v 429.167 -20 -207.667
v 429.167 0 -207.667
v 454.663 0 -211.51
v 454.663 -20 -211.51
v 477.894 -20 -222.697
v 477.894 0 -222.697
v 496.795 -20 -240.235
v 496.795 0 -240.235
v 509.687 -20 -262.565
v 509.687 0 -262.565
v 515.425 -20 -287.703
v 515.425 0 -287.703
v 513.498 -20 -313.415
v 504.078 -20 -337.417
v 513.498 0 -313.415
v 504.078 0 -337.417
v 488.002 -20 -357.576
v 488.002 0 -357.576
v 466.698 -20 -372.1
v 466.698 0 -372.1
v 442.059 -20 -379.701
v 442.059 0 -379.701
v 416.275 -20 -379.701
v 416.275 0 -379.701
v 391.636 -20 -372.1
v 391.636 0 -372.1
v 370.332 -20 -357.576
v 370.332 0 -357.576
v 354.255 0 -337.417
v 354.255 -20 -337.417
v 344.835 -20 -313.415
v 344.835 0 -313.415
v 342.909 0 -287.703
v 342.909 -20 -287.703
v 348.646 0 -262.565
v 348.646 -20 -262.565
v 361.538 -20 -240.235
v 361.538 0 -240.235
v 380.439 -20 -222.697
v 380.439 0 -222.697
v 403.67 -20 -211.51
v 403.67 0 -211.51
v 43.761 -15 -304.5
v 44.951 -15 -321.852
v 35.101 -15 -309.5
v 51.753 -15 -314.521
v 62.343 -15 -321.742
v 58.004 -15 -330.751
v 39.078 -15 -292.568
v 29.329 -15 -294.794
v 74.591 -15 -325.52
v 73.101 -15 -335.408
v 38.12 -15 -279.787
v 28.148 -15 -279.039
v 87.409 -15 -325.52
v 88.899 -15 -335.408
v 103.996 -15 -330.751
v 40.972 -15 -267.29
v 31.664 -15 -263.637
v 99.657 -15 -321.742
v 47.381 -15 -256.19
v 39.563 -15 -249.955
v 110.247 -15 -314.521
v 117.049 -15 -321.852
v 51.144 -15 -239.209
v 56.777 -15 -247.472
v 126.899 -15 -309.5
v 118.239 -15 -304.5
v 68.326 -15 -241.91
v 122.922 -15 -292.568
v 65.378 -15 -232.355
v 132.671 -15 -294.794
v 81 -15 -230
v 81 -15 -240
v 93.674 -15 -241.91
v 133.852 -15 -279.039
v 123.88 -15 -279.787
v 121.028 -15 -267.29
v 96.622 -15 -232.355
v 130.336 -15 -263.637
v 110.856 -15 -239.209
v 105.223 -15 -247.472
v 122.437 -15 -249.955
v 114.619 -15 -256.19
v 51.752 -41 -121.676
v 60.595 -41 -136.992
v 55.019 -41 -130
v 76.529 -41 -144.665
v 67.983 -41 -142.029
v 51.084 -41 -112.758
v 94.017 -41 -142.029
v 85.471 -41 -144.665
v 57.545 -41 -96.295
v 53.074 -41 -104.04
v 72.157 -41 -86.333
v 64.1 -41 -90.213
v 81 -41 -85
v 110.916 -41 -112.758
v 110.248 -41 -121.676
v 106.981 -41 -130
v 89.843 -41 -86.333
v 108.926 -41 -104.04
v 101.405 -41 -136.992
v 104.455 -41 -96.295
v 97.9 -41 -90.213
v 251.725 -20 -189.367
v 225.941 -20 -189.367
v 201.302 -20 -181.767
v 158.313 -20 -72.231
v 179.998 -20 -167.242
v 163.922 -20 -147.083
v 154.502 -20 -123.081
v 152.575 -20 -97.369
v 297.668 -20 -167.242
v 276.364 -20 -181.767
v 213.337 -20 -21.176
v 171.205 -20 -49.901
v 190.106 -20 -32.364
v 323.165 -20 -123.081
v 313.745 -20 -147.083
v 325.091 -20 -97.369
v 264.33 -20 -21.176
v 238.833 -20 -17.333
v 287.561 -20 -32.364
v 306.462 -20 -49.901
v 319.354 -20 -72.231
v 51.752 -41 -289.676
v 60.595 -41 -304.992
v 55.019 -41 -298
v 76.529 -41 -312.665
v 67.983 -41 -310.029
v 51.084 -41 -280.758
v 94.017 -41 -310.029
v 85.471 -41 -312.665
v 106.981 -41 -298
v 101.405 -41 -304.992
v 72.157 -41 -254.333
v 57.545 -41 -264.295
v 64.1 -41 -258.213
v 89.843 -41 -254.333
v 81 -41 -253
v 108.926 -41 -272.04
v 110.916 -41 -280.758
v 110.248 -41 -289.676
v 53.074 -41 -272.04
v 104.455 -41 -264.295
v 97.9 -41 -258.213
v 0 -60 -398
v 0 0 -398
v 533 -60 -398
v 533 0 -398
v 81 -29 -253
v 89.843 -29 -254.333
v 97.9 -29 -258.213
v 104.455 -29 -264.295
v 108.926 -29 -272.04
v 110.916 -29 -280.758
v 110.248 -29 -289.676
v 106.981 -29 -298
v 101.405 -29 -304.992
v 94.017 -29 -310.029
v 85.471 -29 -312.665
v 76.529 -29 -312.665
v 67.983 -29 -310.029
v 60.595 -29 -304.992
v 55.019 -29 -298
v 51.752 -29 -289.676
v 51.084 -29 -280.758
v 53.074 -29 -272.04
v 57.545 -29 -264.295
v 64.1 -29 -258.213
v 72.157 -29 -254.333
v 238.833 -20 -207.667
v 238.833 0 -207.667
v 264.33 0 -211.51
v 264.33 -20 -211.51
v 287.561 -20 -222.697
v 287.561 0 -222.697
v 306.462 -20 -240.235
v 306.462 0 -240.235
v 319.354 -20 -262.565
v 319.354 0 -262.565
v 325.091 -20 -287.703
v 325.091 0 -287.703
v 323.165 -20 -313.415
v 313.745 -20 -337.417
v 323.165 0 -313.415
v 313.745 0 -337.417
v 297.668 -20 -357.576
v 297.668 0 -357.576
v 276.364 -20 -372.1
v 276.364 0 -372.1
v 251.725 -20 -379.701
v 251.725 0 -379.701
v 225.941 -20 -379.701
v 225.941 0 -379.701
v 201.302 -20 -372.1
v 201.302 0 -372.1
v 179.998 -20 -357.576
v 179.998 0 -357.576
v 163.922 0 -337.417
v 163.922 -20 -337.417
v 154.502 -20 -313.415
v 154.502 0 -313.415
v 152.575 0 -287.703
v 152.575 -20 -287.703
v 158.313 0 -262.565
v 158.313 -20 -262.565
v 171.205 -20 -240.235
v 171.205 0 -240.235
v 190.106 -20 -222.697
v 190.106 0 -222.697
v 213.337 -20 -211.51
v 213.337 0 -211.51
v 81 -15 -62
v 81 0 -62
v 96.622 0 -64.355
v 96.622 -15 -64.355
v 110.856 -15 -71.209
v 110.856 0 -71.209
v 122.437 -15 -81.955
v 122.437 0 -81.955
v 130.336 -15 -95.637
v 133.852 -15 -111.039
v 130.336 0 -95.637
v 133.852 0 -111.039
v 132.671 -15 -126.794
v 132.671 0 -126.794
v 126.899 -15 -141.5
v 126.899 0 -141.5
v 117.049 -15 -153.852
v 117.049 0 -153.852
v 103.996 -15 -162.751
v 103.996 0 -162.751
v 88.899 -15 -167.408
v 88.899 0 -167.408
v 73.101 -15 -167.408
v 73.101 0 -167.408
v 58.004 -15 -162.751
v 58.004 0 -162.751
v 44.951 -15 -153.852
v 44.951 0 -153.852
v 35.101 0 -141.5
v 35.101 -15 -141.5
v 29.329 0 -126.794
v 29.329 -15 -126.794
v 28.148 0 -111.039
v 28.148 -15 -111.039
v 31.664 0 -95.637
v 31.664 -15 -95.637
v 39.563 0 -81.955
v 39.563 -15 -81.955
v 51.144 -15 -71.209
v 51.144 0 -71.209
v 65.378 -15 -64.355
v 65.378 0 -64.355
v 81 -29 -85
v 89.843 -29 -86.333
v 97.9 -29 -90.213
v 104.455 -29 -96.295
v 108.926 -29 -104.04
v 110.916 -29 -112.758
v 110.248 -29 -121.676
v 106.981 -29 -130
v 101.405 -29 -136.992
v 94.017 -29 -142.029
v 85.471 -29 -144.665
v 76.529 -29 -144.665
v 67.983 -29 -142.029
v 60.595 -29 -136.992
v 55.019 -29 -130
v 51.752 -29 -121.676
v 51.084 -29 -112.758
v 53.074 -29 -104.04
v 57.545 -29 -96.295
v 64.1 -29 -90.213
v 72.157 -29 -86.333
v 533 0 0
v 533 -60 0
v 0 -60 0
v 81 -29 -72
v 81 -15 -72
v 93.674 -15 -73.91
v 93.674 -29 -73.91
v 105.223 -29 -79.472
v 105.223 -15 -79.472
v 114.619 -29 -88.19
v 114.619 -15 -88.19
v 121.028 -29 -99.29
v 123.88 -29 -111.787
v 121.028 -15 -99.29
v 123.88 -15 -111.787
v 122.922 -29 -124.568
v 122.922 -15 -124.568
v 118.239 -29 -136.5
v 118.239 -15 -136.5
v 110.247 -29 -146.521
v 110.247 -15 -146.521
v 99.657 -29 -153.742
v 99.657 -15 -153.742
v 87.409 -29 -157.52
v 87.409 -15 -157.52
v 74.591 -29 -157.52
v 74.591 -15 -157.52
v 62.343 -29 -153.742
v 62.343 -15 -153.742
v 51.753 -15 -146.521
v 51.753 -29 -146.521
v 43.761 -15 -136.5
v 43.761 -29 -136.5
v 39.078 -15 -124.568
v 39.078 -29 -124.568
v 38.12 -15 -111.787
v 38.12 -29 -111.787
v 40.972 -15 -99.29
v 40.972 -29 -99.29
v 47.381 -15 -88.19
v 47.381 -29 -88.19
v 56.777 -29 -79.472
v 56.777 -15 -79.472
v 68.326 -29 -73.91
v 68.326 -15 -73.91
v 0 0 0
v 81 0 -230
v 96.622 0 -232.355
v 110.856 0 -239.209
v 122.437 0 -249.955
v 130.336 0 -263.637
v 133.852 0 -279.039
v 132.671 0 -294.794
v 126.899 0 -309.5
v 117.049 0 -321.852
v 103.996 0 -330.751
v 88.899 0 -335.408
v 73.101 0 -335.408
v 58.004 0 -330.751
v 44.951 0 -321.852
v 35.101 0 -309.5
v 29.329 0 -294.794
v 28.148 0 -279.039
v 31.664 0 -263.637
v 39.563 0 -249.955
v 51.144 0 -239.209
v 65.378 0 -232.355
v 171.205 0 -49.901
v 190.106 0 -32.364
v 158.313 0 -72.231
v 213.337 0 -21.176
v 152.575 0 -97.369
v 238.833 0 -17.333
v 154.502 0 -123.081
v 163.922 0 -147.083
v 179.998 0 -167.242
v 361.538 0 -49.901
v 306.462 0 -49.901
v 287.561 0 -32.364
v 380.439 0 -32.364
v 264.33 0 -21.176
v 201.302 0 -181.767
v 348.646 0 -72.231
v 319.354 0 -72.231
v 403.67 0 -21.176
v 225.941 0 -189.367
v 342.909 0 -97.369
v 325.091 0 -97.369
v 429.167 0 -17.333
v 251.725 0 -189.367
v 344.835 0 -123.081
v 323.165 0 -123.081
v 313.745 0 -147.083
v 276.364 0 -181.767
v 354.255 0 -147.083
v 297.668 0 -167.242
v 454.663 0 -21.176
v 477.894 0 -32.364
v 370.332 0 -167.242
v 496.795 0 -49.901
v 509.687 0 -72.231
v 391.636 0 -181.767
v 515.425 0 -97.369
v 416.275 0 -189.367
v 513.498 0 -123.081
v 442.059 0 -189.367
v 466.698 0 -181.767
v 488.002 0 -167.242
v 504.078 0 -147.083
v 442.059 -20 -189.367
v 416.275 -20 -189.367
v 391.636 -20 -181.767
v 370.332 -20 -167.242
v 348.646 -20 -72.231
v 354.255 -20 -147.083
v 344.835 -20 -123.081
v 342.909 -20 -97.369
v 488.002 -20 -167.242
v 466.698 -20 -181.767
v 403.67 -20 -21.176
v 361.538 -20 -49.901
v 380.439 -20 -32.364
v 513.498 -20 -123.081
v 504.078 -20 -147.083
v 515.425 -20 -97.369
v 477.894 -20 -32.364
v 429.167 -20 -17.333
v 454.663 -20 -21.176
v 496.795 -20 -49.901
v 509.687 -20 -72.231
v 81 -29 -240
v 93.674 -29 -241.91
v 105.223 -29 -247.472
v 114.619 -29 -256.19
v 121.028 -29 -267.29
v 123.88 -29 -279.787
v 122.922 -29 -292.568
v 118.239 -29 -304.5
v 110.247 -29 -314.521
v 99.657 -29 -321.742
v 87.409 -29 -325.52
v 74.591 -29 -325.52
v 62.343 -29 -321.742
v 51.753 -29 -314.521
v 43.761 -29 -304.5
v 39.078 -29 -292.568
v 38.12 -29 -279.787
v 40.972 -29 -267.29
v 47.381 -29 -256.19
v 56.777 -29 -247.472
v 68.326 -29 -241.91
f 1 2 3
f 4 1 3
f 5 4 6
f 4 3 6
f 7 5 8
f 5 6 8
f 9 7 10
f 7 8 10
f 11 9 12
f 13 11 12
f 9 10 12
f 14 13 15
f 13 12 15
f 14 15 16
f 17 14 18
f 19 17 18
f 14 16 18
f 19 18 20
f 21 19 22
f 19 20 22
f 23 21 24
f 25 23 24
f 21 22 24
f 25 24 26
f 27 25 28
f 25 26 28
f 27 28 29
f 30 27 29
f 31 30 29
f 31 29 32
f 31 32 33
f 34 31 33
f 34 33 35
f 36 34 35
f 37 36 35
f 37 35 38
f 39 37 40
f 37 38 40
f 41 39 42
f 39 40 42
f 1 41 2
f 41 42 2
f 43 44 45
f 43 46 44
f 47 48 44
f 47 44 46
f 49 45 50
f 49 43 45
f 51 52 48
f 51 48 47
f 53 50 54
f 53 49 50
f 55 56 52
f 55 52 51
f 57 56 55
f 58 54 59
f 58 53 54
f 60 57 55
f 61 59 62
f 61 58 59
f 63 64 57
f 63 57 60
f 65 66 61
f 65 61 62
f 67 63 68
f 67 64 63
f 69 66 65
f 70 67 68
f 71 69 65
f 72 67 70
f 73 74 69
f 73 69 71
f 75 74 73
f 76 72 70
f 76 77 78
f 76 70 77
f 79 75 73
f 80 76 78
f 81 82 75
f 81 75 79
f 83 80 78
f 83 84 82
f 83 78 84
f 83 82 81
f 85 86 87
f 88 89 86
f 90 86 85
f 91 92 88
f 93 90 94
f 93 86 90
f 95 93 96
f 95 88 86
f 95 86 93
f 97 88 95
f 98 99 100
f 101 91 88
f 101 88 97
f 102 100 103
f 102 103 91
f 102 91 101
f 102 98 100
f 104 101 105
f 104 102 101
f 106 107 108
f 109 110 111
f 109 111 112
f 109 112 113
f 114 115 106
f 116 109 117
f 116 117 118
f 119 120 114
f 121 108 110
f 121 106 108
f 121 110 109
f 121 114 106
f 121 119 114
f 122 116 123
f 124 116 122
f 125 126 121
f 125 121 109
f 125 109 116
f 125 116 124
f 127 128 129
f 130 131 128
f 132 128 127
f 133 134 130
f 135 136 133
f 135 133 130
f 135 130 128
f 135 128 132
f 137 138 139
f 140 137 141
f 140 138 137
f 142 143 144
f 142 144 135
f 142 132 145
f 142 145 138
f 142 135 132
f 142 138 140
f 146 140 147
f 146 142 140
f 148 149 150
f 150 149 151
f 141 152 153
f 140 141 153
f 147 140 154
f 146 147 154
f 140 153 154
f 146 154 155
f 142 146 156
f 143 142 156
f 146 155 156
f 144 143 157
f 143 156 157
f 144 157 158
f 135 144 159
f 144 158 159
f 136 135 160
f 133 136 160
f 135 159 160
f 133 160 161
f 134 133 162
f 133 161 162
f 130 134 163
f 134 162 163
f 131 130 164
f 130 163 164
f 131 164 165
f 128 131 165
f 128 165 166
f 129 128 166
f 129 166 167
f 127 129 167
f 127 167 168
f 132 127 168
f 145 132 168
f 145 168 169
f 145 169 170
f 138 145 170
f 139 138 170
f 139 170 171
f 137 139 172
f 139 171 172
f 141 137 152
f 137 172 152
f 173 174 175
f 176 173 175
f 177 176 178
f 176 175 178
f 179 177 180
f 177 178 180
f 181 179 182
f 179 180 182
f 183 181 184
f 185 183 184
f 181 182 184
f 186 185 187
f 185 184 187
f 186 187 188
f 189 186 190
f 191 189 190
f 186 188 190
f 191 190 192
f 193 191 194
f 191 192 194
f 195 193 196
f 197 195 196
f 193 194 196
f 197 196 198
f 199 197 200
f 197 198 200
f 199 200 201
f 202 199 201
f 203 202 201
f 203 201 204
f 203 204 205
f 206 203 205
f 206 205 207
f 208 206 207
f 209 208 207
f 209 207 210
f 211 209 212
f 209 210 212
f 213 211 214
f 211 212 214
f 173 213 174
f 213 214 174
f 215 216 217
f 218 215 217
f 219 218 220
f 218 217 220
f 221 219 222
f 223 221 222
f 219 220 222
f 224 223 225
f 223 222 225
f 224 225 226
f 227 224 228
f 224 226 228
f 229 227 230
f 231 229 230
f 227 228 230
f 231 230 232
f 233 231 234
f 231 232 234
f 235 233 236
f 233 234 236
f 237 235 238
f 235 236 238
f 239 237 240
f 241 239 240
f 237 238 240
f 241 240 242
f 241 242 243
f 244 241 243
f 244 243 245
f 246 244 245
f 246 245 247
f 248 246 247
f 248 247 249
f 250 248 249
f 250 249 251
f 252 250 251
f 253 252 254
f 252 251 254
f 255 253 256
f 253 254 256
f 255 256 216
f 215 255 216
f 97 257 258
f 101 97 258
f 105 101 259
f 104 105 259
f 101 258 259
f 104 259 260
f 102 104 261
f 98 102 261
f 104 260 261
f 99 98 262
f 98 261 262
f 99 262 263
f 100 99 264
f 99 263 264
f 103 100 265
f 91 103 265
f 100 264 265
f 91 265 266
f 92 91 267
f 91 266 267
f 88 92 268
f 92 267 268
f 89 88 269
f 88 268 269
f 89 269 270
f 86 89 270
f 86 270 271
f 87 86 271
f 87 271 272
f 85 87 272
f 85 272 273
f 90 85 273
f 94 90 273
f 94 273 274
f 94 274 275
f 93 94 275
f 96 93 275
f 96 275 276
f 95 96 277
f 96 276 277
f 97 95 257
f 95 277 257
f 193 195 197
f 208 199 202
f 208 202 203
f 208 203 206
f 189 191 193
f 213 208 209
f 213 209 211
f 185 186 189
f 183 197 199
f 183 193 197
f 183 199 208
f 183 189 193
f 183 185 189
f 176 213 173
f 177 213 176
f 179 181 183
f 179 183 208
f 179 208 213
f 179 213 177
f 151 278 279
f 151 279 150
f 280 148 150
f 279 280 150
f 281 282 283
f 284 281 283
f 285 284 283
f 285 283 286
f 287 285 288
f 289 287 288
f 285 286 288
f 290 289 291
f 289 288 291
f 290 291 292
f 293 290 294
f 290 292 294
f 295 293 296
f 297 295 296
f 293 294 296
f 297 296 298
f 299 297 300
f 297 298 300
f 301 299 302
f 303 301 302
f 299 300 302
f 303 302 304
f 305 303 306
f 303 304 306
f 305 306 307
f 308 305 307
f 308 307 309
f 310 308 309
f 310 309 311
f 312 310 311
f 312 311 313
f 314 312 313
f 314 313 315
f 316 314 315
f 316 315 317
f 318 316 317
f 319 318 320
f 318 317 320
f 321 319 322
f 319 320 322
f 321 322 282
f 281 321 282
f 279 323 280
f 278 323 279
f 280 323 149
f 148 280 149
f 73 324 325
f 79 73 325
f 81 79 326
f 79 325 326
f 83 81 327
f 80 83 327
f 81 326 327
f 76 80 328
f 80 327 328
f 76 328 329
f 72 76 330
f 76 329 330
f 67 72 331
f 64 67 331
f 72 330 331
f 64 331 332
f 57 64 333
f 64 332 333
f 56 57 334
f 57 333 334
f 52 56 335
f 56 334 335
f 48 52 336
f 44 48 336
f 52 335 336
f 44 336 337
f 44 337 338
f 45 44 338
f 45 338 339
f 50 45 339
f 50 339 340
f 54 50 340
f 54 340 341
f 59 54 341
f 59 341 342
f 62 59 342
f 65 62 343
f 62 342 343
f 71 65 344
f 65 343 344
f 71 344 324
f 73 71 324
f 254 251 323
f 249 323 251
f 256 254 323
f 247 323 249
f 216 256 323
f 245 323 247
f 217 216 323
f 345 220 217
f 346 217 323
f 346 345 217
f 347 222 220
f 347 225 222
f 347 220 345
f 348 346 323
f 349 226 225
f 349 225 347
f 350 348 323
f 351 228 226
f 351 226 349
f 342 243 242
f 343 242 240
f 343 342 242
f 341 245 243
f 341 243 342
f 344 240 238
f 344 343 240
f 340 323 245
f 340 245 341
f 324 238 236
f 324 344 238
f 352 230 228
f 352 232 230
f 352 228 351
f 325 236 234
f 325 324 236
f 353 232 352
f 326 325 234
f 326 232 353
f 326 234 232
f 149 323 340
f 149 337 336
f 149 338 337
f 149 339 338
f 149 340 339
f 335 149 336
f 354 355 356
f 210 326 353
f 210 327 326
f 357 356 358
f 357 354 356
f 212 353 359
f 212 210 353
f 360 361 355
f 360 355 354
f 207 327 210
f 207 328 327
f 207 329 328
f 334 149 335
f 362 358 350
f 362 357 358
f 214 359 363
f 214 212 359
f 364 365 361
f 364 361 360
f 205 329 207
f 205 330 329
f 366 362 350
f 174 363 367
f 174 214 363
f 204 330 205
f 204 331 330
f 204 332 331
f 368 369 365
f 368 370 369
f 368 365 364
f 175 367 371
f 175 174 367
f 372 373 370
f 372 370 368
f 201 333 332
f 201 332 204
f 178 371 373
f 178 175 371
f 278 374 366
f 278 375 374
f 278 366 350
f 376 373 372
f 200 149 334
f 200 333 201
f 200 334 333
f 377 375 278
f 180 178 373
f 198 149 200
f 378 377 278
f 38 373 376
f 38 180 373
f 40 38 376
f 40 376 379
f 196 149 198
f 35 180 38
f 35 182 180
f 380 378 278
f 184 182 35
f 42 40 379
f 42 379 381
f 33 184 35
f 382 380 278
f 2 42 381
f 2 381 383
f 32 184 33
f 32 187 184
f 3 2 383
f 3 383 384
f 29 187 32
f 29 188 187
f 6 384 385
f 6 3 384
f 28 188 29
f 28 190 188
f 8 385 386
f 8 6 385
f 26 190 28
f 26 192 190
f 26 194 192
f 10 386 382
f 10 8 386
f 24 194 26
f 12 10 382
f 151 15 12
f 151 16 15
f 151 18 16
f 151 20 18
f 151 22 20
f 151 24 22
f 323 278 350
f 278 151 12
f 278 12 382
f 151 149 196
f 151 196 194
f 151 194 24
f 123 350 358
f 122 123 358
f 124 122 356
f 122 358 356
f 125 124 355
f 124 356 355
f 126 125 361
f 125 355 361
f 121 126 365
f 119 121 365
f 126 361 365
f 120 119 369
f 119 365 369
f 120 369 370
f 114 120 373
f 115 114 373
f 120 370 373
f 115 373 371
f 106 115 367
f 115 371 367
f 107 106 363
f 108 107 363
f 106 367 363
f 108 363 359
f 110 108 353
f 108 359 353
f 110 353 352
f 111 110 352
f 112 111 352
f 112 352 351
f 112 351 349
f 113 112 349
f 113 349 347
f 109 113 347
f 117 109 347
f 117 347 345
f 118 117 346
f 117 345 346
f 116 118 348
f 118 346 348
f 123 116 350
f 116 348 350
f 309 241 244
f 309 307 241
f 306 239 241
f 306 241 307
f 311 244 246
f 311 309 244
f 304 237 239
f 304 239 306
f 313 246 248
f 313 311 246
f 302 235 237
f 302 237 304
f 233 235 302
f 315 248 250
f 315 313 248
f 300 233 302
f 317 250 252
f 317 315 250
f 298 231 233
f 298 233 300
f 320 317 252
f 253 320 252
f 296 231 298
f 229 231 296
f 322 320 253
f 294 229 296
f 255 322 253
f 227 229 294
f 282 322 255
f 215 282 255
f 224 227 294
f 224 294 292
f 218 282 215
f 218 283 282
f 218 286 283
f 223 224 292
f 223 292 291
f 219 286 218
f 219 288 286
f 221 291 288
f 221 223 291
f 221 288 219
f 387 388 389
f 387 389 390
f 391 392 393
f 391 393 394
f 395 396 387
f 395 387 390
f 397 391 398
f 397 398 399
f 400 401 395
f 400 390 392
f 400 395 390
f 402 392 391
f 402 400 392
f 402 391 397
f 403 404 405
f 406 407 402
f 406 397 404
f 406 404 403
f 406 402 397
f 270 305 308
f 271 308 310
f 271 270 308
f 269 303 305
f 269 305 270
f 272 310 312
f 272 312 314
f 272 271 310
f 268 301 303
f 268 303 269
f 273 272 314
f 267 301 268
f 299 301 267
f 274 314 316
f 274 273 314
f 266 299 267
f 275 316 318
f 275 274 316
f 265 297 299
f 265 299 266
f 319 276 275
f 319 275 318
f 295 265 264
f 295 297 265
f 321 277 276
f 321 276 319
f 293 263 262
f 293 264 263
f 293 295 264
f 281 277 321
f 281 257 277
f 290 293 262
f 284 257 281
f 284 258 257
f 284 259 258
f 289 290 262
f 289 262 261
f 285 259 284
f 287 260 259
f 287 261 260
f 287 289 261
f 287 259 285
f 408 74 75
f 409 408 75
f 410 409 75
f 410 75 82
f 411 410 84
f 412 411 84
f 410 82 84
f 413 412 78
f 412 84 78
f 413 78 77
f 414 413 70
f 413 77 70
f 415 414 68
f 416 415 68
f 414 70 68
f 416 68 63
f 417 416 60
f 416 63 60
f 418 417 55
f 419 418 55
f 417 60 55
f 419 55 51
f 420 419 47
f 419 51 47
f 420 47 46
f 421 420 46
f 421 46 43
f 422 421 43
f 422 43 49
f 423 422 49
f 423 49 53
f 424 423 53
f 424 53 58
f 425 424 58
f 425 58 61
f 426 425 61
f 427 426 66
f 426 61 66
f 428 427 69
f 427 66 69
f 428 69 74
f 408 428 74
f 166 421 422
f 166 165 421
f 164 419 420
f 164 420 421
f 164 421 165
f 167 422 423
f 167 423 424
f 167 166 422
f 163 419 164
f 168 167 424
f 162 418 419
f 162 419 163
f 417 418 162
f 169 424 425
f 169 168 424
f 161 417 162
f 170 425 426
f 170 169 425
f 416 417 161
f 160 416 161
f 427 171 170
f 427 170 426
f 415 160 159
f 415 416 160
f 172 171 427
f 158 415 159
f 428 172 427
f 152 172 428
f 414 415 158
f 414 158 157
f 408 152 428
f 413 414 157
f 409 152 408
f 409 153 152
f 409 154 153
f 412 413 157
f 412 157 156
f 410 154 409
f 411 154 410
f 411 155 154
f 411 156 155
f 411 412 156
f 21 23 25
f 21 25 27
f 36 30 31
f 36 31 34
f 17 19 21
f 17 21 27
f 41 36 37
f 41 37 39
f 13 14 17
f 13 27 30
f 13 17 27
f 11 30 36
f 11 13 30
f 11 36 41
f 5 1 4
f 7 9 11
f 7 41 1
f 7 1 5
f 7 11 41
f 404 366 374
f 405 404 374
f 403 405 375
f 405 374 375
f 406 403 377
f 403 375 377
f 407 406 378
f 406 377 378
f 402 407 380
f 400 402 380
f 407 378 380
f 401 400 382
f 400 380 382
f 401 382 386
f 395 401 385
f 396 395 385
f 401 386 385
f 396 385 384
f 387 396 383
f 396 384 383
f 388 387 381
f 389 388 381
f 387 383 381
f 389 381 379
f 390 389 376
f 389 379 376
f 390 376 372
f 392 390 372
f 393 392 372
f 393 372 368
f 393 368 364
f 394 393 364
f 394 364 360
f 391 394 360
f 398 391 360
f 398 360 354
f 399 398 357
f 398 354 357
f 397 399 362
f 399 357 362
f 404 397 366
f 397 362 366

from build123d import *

# Parameters (mm, degrees)
SKETCH_1_W            = 533
SKETCH_1_H            = 398
EXTRUDE_237_DEPTH     = 60
SKETCH_2_R            = 86.5
CUT_EXTRUDE_597_DEPTH = 20
SKETCH_3_R            = 53
CUT_EXTRUDE_101_DEPTH = 15
SKETCH_6_R            = 43
CUT_EXTRUDE_5_DEPTH   = 14
SKETCH_7_R            = 30
CUT_EXTRUDE_6_DEPTH   = 12


with BuildPart() as part:
    # Эскиз1 → Extrude 237 (new body)
    with BuildSketch(Plane(origin=(0, 0, 0), x_dir=(1, 0, 0), z_dir=(0, 1, 0))):
        with Locations((266.5, 199)):
            Rectangle(SKETCH_1_W, SKETCH_1_H)
    extrude(amount=-EXTRUDE_237_DEPTH)

    # Эскиз2 → Р597 (cut)
    with BuildSketch(Plane(origin=(0, 0, 0), x_dir=(1, 0, 0), z_dir=(0, 1, 0))):
        with Locations(Location((429.166666667, 103.833333333, 0), (0, 0, 270))):
            Circle(SKETCH_2_R)
        with Locations(Location((238.833333333, 103.833333333, 0), (0, 0, 270))):
            Circle(SKETCH_2_R)
        with Locations(Location((238.833333333, 294.166666667, 0), (0, 0, 270))):
            Circle(SKETCH_2_R)
        with Locations(Location((429.166666667, 294.166666667, 0), (0, 0, 270))):
            Circle(SKETCH_2_R)
    extrude(amount=-CUT_EXTRUDE_597_DEPTH, mode=Mode.SUBTRACT)

    # Эскиз3 → КМЕ-101 (cut)
    with BuildSketch(Plane(origin=(0, 0, 0), x_dir=(1, 0, 0), z_dir=(0, 1, 0))):
        with Locations(Location((81, 283, 0), (0, 0, 270))):
            Circle(SKETCH_3_R)
        with Locations(Location((81, 115, 0), (0, 0, 270))):
            Circle(SKETCH_3_R)
    extrude(amount=-CUT_EXTRUDE_101_DEPTH, mode=Mode.SUBTRACT)

    # Эскиз6 → Вырез-Вытянуть5 (cut)
    with BuildSketch(Plane(origin=(0, -15, 0), x_dir=(1, 0, 0), z_dir=(0, 1, 0))):
        with Locations(Location((81, 283, 0), (0, 0, 270))):
            Circle(SKETCH_6_R)
        with Locations(Location((81, 115, 0), (0, 0, 270))):
            Circle(SKETCH_6_R)
    extrude(amount=-CUT_EXTRUDE_5_DEPTH, mode=Mode.SUBTRACT)

    # Эскиз7 → Вырез-Вытянуть6 (cut)
    with BuildSketch(Plane(origin=(0, -29, 0), x_dir=(1, 0, 0), z_dir=(0, 1, 0))):
        with Locations(Location((81, 283, 0), (0, 0, 270))):
            Circle(SKETCH_7_R)
        with Locations(Location((81, 115, 0), (0, 0, 270))):
            Circle(SKETCH_7_R)
    extrude(amount=-CUT_EXTRUDE_6_DEPTH, mode=Mode.SUBTRACT)


solid = part.part
